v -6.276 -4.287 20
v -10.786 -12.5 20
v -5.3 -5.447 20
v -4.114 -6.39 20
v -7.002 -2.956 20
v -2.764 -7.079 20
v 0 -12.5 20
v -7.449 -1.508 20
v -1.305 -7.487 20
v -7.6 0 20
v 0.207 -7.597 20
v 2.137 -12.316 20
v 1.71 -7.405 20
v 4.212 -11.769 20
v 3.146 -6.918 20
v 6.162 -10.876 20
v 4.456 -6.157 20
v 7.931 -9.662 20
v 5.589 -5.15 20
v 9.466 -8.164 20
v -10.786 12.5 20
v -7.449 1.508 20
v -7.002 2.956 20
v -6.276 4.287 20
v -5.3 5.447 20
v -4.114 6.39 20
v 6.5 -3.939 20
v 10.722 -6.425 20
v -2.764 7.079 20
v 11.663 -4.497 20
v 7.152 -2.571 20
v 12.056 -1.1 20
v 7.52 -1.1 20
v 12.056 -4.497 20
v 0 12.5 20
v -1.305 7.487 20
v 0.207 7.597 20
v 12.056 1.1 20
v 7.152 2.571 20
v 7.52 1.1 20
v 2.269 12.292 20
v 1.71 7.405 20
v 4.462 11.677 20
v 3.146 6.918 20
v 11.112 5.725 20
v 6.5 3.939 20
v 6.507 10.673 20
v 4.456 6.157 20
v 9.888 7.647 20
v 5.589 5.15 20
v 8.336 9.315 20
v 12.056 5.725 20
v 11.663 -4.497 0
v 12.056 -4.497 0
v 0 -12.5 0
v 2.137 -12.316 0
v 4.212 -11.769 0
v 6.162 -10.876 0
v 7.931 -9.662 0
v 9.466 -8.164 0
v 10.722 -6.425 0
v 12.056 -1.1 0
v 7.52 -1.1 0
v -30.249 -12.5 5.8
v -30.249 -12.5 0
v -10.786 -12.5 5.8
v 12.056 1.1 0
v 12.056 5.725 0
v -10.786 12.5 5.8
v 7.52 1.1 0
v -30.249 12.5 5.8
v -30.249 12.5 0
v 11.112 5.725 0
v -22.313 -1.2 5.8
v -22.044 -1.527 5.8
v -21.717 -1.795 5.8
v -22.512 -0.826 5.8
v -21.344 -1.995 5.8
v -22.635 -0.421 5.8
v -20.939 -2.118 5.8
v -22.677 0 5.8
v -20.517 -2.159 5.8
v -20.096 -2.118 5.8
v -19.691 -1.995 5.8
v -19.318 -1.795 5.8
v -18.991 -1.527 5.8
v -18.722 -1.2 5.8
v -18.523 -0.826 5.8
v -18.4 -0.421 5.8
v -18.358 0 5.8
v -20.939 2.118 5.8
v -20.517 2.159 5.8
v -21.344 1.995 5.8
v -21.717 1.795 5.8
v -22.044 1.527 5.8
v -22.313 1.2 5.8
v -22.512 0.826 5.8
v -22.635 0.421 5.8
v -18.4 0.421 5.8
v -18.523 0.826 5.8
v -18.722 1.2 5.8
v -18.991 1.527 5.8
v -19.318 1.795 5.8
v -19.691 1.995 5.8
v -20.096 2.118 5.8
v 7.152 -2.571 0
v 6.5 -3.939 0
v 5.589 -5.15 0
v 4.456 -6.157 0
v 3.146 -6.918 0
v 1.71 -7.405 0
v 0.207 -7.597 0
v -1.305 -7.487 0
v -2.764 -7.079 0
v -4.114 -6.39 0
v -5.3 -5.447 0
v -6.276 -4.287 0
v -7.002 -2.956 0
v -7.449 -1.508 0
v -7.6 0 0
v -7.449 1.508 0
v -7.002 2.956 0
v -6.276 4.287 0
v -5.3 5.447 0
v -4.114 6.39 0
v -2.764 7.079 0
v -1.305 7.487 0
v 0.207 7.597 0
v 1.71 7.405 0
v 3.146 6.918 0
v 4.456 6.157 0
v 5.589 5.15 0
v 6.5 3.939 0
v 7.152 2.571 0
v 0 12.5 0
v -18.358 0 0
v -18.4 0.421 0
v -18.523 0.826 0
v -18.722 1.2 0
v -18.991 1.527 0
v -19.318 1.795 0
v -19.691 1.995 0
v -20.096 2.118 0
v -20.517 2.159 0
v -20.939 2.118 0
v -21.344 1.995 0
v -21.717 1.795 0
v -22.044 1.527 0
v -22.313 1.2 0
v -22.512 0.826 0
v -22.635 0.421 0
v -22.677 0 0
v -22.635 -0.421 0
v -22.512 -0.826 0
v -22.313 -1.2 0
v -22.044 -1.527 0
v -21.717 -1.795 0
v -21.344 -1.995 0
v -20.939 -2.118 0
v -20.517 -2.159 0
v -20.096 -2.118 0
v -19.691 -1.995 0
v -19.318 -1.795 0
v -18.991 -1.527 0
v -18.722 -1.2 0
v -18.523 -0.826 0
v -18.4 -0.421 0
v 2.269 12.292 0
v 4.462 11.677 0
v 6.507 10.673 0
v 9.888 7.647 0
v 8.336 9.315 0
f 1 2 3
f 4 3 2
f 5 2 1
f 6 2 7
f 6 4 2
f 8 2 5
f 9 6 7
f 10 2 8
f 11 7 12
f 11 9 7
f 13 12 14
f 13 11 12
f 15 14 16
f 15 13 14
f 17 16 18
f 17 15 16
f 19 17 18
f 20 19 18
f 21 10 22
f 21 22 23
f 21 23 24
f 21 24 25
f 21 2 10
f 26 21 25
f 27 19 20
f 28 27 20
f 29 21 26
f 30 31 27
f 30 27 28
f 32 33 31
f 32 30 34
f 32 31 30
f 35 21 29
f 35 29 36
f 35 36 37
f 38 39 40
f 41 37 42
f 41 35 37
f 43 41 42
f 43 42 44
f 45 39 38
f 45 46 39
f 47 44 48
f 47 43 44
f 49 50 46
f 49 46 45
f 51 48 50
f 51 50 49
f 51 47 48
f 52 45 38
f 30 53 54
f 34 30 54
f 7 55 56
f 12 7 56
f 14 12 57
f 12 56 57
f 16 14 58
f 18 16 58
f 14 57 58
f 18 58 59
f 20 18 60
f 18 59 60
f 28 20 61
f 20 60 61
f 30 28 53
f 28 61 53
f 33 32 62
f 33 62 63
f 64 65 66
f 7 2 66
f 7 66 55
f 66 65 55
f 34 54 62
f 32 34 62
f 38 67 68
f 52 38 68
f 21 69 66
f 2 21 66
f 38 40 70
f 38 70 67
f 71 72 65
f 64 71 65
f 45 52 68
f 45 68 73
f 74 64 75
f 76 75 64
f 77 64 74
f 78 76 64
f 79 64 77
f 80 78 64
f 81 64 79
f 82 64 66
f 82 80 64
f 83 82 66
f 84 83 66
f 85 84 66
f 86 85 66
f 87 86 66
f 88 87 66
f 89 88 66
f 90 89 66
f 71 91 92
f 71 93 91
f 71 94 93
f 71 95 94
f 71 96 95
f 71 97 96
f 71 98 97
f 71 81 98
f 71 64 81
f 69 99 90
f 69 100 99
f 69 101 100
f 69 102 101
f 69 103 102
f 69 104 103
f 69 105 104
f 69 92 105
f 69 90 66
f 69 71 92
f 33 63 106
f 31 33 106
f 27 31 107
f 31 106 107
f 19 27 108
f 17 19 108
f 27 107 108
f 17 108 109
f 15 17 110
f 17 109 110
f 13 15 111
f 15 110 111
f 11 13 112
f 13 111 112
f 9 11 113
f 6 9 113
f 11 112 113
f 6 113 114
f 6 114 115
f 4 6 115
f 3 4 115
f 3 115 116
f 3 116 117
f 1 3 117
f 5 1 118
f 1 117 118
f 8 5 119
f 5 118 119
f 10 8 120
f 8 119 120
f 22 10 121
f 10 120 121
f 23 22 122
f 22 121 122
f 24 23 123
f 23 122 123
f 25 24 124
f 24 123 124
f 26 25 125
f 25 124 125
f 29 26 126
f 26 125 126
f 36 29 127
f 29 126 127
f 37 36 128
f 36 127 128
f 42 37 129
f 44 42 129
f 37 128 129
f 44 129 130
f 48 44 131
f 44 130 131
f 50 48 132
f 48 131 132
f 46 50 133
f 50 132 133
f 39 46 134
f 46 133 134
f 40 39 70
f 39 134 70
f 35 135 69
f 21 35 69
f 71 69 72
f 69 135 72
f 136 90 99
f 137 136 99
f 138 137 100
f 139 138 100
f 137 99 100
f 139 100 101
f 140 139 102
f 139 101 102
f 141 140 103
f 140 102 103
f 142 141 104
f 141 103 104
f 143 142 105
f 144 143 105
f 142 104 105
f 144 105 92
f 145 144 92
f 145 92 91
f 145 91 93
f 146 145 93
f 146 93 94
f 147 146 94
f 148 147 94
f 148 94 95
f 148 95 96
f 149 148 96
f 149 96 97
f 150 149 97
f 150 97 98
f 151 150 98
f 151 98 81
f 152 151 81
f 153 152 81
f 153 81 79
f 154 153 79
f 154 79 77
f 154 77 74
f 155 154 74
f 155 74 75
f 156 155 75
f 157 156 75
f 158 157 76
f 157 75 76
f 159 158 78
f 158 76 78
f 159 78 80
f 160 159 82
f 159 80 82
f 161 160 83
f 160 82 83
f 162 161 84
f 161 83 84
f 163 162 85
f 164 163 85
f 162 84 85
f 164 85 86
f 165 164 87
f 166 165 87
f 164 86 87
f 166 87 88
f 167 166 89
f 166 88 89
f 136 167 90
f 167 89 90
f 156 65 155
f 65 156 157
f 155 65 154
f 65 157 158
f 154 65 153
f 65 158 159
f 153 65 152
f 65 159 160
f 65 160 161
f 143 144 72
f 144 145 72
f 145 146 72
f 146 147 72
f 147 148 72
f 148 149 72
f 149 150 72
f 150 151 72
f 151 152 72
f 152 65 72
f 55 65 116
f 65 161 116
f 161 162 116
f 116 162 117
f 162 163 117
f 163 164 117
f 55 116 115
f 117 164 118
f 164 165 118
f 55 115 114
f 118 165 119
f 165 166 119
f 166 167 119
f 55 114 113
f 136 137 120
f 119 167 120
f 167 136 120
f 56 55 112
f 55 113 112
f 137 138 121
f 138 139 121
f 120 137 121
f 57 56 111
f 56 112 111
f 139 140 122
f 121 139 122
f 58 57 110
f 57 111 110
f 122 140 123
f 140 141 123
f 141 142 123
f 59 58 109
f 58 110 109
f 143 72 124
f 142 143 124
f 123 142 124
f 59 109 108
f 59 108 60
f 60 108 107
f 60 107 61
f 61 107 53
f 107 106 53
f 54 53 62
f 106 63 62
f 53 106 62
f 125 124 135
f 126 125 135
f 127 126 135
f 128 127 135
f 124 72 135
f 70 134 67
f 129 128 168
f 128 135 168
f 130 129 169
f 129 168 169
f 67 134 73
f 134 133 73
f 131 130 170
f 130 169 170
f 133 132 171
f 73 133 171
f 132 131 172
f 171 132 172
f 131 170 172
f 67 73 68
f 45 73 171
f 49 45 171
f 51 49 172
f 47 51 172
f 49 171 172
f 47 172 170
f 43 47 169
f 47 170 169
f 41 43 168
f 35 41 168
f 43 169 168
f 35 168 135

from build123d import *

# Parameters (mm, degrees)
F1_DEPTH = 20
F2_DEPTH = 5.8
F3_R     = 2.1592673483
F4_DEPTH = 25


# Not quite as in the source:
# - a feature names something its author has since deleted; it is built from what else it names


with BuildPart() as f1:
    # F0 (on Top) → F1 (new body)
    with BuildSketch(Plane.XY):
        with BuildLine():
            ThreePointArc((7.5199086274, -1.1004427451), (-7.6, 0), (7.5199086274, 1.1004427451))
            Line((7.5199086274, 1.1004427451), (12.0555223817, 1.1004427451))
            Line((12.0555223817, 1.1004427451), (12.0555223817, 5.7252630293))
            Line((12.0555223817, 5.7252630293), (11.1117668822, 5.7252630293))
            ThreePointArc((11.1117668822, 5.7252630293), (6.5070812248, 10.6727641187), (0, 12.5))
            Line((0, 12.5), (-10.78635397, 12.5))
            Line((-10.78635397, 12.5), (-10.78635397, 4.5))
            Line((-10.78635397, 4.5), (-10.78635397, -4.5))
            Line((-10.78635397, -4.5), (-10.78635397, -12.5))
            Line((-10.78635397, -12.5), (0, -12.5))
            ThreePointArc((0, -12.5), (7.0722638762, -10.3069434687), (11.6629478347, -4.4972933866))
            Line((11.6629478347, -4.4972933866), (12.0555223817, -4.4972933866))
            Line((12.0555223817, -4.4972933866), (12.0555223817, -1.1004427451))
            Line((12.0555223817, -1.1004427451), (7.5199086274, -1.1004427451))
        make_face()
    extrude(amount=F1_DEPTH)

    # F0 (on Top) → F2 (join)
    with BuildSketch(Plane.XY):
        Polygon((-10.78635397, 4.5), (-10.78635397, 12.5), (-30.2485086955, 12.5), (-30.2485086955, -4.5), (-30.2485086955, -12.5), (-10.78635397, -12.5), (-10.78635397, -4.5), align=None)
    extrude(amount=F2_DEPTH)

    # F3 (on face) → F4 (cut)
    with BuildSketch(Plane.XY.offset(5.8)):
        with Locations((-20.5174313327, 0)):
            Circle(F3_R)
    extrude(amount=-F4_DEPTH, mode=Mode.SUBTRACT)


solid = f1.part
